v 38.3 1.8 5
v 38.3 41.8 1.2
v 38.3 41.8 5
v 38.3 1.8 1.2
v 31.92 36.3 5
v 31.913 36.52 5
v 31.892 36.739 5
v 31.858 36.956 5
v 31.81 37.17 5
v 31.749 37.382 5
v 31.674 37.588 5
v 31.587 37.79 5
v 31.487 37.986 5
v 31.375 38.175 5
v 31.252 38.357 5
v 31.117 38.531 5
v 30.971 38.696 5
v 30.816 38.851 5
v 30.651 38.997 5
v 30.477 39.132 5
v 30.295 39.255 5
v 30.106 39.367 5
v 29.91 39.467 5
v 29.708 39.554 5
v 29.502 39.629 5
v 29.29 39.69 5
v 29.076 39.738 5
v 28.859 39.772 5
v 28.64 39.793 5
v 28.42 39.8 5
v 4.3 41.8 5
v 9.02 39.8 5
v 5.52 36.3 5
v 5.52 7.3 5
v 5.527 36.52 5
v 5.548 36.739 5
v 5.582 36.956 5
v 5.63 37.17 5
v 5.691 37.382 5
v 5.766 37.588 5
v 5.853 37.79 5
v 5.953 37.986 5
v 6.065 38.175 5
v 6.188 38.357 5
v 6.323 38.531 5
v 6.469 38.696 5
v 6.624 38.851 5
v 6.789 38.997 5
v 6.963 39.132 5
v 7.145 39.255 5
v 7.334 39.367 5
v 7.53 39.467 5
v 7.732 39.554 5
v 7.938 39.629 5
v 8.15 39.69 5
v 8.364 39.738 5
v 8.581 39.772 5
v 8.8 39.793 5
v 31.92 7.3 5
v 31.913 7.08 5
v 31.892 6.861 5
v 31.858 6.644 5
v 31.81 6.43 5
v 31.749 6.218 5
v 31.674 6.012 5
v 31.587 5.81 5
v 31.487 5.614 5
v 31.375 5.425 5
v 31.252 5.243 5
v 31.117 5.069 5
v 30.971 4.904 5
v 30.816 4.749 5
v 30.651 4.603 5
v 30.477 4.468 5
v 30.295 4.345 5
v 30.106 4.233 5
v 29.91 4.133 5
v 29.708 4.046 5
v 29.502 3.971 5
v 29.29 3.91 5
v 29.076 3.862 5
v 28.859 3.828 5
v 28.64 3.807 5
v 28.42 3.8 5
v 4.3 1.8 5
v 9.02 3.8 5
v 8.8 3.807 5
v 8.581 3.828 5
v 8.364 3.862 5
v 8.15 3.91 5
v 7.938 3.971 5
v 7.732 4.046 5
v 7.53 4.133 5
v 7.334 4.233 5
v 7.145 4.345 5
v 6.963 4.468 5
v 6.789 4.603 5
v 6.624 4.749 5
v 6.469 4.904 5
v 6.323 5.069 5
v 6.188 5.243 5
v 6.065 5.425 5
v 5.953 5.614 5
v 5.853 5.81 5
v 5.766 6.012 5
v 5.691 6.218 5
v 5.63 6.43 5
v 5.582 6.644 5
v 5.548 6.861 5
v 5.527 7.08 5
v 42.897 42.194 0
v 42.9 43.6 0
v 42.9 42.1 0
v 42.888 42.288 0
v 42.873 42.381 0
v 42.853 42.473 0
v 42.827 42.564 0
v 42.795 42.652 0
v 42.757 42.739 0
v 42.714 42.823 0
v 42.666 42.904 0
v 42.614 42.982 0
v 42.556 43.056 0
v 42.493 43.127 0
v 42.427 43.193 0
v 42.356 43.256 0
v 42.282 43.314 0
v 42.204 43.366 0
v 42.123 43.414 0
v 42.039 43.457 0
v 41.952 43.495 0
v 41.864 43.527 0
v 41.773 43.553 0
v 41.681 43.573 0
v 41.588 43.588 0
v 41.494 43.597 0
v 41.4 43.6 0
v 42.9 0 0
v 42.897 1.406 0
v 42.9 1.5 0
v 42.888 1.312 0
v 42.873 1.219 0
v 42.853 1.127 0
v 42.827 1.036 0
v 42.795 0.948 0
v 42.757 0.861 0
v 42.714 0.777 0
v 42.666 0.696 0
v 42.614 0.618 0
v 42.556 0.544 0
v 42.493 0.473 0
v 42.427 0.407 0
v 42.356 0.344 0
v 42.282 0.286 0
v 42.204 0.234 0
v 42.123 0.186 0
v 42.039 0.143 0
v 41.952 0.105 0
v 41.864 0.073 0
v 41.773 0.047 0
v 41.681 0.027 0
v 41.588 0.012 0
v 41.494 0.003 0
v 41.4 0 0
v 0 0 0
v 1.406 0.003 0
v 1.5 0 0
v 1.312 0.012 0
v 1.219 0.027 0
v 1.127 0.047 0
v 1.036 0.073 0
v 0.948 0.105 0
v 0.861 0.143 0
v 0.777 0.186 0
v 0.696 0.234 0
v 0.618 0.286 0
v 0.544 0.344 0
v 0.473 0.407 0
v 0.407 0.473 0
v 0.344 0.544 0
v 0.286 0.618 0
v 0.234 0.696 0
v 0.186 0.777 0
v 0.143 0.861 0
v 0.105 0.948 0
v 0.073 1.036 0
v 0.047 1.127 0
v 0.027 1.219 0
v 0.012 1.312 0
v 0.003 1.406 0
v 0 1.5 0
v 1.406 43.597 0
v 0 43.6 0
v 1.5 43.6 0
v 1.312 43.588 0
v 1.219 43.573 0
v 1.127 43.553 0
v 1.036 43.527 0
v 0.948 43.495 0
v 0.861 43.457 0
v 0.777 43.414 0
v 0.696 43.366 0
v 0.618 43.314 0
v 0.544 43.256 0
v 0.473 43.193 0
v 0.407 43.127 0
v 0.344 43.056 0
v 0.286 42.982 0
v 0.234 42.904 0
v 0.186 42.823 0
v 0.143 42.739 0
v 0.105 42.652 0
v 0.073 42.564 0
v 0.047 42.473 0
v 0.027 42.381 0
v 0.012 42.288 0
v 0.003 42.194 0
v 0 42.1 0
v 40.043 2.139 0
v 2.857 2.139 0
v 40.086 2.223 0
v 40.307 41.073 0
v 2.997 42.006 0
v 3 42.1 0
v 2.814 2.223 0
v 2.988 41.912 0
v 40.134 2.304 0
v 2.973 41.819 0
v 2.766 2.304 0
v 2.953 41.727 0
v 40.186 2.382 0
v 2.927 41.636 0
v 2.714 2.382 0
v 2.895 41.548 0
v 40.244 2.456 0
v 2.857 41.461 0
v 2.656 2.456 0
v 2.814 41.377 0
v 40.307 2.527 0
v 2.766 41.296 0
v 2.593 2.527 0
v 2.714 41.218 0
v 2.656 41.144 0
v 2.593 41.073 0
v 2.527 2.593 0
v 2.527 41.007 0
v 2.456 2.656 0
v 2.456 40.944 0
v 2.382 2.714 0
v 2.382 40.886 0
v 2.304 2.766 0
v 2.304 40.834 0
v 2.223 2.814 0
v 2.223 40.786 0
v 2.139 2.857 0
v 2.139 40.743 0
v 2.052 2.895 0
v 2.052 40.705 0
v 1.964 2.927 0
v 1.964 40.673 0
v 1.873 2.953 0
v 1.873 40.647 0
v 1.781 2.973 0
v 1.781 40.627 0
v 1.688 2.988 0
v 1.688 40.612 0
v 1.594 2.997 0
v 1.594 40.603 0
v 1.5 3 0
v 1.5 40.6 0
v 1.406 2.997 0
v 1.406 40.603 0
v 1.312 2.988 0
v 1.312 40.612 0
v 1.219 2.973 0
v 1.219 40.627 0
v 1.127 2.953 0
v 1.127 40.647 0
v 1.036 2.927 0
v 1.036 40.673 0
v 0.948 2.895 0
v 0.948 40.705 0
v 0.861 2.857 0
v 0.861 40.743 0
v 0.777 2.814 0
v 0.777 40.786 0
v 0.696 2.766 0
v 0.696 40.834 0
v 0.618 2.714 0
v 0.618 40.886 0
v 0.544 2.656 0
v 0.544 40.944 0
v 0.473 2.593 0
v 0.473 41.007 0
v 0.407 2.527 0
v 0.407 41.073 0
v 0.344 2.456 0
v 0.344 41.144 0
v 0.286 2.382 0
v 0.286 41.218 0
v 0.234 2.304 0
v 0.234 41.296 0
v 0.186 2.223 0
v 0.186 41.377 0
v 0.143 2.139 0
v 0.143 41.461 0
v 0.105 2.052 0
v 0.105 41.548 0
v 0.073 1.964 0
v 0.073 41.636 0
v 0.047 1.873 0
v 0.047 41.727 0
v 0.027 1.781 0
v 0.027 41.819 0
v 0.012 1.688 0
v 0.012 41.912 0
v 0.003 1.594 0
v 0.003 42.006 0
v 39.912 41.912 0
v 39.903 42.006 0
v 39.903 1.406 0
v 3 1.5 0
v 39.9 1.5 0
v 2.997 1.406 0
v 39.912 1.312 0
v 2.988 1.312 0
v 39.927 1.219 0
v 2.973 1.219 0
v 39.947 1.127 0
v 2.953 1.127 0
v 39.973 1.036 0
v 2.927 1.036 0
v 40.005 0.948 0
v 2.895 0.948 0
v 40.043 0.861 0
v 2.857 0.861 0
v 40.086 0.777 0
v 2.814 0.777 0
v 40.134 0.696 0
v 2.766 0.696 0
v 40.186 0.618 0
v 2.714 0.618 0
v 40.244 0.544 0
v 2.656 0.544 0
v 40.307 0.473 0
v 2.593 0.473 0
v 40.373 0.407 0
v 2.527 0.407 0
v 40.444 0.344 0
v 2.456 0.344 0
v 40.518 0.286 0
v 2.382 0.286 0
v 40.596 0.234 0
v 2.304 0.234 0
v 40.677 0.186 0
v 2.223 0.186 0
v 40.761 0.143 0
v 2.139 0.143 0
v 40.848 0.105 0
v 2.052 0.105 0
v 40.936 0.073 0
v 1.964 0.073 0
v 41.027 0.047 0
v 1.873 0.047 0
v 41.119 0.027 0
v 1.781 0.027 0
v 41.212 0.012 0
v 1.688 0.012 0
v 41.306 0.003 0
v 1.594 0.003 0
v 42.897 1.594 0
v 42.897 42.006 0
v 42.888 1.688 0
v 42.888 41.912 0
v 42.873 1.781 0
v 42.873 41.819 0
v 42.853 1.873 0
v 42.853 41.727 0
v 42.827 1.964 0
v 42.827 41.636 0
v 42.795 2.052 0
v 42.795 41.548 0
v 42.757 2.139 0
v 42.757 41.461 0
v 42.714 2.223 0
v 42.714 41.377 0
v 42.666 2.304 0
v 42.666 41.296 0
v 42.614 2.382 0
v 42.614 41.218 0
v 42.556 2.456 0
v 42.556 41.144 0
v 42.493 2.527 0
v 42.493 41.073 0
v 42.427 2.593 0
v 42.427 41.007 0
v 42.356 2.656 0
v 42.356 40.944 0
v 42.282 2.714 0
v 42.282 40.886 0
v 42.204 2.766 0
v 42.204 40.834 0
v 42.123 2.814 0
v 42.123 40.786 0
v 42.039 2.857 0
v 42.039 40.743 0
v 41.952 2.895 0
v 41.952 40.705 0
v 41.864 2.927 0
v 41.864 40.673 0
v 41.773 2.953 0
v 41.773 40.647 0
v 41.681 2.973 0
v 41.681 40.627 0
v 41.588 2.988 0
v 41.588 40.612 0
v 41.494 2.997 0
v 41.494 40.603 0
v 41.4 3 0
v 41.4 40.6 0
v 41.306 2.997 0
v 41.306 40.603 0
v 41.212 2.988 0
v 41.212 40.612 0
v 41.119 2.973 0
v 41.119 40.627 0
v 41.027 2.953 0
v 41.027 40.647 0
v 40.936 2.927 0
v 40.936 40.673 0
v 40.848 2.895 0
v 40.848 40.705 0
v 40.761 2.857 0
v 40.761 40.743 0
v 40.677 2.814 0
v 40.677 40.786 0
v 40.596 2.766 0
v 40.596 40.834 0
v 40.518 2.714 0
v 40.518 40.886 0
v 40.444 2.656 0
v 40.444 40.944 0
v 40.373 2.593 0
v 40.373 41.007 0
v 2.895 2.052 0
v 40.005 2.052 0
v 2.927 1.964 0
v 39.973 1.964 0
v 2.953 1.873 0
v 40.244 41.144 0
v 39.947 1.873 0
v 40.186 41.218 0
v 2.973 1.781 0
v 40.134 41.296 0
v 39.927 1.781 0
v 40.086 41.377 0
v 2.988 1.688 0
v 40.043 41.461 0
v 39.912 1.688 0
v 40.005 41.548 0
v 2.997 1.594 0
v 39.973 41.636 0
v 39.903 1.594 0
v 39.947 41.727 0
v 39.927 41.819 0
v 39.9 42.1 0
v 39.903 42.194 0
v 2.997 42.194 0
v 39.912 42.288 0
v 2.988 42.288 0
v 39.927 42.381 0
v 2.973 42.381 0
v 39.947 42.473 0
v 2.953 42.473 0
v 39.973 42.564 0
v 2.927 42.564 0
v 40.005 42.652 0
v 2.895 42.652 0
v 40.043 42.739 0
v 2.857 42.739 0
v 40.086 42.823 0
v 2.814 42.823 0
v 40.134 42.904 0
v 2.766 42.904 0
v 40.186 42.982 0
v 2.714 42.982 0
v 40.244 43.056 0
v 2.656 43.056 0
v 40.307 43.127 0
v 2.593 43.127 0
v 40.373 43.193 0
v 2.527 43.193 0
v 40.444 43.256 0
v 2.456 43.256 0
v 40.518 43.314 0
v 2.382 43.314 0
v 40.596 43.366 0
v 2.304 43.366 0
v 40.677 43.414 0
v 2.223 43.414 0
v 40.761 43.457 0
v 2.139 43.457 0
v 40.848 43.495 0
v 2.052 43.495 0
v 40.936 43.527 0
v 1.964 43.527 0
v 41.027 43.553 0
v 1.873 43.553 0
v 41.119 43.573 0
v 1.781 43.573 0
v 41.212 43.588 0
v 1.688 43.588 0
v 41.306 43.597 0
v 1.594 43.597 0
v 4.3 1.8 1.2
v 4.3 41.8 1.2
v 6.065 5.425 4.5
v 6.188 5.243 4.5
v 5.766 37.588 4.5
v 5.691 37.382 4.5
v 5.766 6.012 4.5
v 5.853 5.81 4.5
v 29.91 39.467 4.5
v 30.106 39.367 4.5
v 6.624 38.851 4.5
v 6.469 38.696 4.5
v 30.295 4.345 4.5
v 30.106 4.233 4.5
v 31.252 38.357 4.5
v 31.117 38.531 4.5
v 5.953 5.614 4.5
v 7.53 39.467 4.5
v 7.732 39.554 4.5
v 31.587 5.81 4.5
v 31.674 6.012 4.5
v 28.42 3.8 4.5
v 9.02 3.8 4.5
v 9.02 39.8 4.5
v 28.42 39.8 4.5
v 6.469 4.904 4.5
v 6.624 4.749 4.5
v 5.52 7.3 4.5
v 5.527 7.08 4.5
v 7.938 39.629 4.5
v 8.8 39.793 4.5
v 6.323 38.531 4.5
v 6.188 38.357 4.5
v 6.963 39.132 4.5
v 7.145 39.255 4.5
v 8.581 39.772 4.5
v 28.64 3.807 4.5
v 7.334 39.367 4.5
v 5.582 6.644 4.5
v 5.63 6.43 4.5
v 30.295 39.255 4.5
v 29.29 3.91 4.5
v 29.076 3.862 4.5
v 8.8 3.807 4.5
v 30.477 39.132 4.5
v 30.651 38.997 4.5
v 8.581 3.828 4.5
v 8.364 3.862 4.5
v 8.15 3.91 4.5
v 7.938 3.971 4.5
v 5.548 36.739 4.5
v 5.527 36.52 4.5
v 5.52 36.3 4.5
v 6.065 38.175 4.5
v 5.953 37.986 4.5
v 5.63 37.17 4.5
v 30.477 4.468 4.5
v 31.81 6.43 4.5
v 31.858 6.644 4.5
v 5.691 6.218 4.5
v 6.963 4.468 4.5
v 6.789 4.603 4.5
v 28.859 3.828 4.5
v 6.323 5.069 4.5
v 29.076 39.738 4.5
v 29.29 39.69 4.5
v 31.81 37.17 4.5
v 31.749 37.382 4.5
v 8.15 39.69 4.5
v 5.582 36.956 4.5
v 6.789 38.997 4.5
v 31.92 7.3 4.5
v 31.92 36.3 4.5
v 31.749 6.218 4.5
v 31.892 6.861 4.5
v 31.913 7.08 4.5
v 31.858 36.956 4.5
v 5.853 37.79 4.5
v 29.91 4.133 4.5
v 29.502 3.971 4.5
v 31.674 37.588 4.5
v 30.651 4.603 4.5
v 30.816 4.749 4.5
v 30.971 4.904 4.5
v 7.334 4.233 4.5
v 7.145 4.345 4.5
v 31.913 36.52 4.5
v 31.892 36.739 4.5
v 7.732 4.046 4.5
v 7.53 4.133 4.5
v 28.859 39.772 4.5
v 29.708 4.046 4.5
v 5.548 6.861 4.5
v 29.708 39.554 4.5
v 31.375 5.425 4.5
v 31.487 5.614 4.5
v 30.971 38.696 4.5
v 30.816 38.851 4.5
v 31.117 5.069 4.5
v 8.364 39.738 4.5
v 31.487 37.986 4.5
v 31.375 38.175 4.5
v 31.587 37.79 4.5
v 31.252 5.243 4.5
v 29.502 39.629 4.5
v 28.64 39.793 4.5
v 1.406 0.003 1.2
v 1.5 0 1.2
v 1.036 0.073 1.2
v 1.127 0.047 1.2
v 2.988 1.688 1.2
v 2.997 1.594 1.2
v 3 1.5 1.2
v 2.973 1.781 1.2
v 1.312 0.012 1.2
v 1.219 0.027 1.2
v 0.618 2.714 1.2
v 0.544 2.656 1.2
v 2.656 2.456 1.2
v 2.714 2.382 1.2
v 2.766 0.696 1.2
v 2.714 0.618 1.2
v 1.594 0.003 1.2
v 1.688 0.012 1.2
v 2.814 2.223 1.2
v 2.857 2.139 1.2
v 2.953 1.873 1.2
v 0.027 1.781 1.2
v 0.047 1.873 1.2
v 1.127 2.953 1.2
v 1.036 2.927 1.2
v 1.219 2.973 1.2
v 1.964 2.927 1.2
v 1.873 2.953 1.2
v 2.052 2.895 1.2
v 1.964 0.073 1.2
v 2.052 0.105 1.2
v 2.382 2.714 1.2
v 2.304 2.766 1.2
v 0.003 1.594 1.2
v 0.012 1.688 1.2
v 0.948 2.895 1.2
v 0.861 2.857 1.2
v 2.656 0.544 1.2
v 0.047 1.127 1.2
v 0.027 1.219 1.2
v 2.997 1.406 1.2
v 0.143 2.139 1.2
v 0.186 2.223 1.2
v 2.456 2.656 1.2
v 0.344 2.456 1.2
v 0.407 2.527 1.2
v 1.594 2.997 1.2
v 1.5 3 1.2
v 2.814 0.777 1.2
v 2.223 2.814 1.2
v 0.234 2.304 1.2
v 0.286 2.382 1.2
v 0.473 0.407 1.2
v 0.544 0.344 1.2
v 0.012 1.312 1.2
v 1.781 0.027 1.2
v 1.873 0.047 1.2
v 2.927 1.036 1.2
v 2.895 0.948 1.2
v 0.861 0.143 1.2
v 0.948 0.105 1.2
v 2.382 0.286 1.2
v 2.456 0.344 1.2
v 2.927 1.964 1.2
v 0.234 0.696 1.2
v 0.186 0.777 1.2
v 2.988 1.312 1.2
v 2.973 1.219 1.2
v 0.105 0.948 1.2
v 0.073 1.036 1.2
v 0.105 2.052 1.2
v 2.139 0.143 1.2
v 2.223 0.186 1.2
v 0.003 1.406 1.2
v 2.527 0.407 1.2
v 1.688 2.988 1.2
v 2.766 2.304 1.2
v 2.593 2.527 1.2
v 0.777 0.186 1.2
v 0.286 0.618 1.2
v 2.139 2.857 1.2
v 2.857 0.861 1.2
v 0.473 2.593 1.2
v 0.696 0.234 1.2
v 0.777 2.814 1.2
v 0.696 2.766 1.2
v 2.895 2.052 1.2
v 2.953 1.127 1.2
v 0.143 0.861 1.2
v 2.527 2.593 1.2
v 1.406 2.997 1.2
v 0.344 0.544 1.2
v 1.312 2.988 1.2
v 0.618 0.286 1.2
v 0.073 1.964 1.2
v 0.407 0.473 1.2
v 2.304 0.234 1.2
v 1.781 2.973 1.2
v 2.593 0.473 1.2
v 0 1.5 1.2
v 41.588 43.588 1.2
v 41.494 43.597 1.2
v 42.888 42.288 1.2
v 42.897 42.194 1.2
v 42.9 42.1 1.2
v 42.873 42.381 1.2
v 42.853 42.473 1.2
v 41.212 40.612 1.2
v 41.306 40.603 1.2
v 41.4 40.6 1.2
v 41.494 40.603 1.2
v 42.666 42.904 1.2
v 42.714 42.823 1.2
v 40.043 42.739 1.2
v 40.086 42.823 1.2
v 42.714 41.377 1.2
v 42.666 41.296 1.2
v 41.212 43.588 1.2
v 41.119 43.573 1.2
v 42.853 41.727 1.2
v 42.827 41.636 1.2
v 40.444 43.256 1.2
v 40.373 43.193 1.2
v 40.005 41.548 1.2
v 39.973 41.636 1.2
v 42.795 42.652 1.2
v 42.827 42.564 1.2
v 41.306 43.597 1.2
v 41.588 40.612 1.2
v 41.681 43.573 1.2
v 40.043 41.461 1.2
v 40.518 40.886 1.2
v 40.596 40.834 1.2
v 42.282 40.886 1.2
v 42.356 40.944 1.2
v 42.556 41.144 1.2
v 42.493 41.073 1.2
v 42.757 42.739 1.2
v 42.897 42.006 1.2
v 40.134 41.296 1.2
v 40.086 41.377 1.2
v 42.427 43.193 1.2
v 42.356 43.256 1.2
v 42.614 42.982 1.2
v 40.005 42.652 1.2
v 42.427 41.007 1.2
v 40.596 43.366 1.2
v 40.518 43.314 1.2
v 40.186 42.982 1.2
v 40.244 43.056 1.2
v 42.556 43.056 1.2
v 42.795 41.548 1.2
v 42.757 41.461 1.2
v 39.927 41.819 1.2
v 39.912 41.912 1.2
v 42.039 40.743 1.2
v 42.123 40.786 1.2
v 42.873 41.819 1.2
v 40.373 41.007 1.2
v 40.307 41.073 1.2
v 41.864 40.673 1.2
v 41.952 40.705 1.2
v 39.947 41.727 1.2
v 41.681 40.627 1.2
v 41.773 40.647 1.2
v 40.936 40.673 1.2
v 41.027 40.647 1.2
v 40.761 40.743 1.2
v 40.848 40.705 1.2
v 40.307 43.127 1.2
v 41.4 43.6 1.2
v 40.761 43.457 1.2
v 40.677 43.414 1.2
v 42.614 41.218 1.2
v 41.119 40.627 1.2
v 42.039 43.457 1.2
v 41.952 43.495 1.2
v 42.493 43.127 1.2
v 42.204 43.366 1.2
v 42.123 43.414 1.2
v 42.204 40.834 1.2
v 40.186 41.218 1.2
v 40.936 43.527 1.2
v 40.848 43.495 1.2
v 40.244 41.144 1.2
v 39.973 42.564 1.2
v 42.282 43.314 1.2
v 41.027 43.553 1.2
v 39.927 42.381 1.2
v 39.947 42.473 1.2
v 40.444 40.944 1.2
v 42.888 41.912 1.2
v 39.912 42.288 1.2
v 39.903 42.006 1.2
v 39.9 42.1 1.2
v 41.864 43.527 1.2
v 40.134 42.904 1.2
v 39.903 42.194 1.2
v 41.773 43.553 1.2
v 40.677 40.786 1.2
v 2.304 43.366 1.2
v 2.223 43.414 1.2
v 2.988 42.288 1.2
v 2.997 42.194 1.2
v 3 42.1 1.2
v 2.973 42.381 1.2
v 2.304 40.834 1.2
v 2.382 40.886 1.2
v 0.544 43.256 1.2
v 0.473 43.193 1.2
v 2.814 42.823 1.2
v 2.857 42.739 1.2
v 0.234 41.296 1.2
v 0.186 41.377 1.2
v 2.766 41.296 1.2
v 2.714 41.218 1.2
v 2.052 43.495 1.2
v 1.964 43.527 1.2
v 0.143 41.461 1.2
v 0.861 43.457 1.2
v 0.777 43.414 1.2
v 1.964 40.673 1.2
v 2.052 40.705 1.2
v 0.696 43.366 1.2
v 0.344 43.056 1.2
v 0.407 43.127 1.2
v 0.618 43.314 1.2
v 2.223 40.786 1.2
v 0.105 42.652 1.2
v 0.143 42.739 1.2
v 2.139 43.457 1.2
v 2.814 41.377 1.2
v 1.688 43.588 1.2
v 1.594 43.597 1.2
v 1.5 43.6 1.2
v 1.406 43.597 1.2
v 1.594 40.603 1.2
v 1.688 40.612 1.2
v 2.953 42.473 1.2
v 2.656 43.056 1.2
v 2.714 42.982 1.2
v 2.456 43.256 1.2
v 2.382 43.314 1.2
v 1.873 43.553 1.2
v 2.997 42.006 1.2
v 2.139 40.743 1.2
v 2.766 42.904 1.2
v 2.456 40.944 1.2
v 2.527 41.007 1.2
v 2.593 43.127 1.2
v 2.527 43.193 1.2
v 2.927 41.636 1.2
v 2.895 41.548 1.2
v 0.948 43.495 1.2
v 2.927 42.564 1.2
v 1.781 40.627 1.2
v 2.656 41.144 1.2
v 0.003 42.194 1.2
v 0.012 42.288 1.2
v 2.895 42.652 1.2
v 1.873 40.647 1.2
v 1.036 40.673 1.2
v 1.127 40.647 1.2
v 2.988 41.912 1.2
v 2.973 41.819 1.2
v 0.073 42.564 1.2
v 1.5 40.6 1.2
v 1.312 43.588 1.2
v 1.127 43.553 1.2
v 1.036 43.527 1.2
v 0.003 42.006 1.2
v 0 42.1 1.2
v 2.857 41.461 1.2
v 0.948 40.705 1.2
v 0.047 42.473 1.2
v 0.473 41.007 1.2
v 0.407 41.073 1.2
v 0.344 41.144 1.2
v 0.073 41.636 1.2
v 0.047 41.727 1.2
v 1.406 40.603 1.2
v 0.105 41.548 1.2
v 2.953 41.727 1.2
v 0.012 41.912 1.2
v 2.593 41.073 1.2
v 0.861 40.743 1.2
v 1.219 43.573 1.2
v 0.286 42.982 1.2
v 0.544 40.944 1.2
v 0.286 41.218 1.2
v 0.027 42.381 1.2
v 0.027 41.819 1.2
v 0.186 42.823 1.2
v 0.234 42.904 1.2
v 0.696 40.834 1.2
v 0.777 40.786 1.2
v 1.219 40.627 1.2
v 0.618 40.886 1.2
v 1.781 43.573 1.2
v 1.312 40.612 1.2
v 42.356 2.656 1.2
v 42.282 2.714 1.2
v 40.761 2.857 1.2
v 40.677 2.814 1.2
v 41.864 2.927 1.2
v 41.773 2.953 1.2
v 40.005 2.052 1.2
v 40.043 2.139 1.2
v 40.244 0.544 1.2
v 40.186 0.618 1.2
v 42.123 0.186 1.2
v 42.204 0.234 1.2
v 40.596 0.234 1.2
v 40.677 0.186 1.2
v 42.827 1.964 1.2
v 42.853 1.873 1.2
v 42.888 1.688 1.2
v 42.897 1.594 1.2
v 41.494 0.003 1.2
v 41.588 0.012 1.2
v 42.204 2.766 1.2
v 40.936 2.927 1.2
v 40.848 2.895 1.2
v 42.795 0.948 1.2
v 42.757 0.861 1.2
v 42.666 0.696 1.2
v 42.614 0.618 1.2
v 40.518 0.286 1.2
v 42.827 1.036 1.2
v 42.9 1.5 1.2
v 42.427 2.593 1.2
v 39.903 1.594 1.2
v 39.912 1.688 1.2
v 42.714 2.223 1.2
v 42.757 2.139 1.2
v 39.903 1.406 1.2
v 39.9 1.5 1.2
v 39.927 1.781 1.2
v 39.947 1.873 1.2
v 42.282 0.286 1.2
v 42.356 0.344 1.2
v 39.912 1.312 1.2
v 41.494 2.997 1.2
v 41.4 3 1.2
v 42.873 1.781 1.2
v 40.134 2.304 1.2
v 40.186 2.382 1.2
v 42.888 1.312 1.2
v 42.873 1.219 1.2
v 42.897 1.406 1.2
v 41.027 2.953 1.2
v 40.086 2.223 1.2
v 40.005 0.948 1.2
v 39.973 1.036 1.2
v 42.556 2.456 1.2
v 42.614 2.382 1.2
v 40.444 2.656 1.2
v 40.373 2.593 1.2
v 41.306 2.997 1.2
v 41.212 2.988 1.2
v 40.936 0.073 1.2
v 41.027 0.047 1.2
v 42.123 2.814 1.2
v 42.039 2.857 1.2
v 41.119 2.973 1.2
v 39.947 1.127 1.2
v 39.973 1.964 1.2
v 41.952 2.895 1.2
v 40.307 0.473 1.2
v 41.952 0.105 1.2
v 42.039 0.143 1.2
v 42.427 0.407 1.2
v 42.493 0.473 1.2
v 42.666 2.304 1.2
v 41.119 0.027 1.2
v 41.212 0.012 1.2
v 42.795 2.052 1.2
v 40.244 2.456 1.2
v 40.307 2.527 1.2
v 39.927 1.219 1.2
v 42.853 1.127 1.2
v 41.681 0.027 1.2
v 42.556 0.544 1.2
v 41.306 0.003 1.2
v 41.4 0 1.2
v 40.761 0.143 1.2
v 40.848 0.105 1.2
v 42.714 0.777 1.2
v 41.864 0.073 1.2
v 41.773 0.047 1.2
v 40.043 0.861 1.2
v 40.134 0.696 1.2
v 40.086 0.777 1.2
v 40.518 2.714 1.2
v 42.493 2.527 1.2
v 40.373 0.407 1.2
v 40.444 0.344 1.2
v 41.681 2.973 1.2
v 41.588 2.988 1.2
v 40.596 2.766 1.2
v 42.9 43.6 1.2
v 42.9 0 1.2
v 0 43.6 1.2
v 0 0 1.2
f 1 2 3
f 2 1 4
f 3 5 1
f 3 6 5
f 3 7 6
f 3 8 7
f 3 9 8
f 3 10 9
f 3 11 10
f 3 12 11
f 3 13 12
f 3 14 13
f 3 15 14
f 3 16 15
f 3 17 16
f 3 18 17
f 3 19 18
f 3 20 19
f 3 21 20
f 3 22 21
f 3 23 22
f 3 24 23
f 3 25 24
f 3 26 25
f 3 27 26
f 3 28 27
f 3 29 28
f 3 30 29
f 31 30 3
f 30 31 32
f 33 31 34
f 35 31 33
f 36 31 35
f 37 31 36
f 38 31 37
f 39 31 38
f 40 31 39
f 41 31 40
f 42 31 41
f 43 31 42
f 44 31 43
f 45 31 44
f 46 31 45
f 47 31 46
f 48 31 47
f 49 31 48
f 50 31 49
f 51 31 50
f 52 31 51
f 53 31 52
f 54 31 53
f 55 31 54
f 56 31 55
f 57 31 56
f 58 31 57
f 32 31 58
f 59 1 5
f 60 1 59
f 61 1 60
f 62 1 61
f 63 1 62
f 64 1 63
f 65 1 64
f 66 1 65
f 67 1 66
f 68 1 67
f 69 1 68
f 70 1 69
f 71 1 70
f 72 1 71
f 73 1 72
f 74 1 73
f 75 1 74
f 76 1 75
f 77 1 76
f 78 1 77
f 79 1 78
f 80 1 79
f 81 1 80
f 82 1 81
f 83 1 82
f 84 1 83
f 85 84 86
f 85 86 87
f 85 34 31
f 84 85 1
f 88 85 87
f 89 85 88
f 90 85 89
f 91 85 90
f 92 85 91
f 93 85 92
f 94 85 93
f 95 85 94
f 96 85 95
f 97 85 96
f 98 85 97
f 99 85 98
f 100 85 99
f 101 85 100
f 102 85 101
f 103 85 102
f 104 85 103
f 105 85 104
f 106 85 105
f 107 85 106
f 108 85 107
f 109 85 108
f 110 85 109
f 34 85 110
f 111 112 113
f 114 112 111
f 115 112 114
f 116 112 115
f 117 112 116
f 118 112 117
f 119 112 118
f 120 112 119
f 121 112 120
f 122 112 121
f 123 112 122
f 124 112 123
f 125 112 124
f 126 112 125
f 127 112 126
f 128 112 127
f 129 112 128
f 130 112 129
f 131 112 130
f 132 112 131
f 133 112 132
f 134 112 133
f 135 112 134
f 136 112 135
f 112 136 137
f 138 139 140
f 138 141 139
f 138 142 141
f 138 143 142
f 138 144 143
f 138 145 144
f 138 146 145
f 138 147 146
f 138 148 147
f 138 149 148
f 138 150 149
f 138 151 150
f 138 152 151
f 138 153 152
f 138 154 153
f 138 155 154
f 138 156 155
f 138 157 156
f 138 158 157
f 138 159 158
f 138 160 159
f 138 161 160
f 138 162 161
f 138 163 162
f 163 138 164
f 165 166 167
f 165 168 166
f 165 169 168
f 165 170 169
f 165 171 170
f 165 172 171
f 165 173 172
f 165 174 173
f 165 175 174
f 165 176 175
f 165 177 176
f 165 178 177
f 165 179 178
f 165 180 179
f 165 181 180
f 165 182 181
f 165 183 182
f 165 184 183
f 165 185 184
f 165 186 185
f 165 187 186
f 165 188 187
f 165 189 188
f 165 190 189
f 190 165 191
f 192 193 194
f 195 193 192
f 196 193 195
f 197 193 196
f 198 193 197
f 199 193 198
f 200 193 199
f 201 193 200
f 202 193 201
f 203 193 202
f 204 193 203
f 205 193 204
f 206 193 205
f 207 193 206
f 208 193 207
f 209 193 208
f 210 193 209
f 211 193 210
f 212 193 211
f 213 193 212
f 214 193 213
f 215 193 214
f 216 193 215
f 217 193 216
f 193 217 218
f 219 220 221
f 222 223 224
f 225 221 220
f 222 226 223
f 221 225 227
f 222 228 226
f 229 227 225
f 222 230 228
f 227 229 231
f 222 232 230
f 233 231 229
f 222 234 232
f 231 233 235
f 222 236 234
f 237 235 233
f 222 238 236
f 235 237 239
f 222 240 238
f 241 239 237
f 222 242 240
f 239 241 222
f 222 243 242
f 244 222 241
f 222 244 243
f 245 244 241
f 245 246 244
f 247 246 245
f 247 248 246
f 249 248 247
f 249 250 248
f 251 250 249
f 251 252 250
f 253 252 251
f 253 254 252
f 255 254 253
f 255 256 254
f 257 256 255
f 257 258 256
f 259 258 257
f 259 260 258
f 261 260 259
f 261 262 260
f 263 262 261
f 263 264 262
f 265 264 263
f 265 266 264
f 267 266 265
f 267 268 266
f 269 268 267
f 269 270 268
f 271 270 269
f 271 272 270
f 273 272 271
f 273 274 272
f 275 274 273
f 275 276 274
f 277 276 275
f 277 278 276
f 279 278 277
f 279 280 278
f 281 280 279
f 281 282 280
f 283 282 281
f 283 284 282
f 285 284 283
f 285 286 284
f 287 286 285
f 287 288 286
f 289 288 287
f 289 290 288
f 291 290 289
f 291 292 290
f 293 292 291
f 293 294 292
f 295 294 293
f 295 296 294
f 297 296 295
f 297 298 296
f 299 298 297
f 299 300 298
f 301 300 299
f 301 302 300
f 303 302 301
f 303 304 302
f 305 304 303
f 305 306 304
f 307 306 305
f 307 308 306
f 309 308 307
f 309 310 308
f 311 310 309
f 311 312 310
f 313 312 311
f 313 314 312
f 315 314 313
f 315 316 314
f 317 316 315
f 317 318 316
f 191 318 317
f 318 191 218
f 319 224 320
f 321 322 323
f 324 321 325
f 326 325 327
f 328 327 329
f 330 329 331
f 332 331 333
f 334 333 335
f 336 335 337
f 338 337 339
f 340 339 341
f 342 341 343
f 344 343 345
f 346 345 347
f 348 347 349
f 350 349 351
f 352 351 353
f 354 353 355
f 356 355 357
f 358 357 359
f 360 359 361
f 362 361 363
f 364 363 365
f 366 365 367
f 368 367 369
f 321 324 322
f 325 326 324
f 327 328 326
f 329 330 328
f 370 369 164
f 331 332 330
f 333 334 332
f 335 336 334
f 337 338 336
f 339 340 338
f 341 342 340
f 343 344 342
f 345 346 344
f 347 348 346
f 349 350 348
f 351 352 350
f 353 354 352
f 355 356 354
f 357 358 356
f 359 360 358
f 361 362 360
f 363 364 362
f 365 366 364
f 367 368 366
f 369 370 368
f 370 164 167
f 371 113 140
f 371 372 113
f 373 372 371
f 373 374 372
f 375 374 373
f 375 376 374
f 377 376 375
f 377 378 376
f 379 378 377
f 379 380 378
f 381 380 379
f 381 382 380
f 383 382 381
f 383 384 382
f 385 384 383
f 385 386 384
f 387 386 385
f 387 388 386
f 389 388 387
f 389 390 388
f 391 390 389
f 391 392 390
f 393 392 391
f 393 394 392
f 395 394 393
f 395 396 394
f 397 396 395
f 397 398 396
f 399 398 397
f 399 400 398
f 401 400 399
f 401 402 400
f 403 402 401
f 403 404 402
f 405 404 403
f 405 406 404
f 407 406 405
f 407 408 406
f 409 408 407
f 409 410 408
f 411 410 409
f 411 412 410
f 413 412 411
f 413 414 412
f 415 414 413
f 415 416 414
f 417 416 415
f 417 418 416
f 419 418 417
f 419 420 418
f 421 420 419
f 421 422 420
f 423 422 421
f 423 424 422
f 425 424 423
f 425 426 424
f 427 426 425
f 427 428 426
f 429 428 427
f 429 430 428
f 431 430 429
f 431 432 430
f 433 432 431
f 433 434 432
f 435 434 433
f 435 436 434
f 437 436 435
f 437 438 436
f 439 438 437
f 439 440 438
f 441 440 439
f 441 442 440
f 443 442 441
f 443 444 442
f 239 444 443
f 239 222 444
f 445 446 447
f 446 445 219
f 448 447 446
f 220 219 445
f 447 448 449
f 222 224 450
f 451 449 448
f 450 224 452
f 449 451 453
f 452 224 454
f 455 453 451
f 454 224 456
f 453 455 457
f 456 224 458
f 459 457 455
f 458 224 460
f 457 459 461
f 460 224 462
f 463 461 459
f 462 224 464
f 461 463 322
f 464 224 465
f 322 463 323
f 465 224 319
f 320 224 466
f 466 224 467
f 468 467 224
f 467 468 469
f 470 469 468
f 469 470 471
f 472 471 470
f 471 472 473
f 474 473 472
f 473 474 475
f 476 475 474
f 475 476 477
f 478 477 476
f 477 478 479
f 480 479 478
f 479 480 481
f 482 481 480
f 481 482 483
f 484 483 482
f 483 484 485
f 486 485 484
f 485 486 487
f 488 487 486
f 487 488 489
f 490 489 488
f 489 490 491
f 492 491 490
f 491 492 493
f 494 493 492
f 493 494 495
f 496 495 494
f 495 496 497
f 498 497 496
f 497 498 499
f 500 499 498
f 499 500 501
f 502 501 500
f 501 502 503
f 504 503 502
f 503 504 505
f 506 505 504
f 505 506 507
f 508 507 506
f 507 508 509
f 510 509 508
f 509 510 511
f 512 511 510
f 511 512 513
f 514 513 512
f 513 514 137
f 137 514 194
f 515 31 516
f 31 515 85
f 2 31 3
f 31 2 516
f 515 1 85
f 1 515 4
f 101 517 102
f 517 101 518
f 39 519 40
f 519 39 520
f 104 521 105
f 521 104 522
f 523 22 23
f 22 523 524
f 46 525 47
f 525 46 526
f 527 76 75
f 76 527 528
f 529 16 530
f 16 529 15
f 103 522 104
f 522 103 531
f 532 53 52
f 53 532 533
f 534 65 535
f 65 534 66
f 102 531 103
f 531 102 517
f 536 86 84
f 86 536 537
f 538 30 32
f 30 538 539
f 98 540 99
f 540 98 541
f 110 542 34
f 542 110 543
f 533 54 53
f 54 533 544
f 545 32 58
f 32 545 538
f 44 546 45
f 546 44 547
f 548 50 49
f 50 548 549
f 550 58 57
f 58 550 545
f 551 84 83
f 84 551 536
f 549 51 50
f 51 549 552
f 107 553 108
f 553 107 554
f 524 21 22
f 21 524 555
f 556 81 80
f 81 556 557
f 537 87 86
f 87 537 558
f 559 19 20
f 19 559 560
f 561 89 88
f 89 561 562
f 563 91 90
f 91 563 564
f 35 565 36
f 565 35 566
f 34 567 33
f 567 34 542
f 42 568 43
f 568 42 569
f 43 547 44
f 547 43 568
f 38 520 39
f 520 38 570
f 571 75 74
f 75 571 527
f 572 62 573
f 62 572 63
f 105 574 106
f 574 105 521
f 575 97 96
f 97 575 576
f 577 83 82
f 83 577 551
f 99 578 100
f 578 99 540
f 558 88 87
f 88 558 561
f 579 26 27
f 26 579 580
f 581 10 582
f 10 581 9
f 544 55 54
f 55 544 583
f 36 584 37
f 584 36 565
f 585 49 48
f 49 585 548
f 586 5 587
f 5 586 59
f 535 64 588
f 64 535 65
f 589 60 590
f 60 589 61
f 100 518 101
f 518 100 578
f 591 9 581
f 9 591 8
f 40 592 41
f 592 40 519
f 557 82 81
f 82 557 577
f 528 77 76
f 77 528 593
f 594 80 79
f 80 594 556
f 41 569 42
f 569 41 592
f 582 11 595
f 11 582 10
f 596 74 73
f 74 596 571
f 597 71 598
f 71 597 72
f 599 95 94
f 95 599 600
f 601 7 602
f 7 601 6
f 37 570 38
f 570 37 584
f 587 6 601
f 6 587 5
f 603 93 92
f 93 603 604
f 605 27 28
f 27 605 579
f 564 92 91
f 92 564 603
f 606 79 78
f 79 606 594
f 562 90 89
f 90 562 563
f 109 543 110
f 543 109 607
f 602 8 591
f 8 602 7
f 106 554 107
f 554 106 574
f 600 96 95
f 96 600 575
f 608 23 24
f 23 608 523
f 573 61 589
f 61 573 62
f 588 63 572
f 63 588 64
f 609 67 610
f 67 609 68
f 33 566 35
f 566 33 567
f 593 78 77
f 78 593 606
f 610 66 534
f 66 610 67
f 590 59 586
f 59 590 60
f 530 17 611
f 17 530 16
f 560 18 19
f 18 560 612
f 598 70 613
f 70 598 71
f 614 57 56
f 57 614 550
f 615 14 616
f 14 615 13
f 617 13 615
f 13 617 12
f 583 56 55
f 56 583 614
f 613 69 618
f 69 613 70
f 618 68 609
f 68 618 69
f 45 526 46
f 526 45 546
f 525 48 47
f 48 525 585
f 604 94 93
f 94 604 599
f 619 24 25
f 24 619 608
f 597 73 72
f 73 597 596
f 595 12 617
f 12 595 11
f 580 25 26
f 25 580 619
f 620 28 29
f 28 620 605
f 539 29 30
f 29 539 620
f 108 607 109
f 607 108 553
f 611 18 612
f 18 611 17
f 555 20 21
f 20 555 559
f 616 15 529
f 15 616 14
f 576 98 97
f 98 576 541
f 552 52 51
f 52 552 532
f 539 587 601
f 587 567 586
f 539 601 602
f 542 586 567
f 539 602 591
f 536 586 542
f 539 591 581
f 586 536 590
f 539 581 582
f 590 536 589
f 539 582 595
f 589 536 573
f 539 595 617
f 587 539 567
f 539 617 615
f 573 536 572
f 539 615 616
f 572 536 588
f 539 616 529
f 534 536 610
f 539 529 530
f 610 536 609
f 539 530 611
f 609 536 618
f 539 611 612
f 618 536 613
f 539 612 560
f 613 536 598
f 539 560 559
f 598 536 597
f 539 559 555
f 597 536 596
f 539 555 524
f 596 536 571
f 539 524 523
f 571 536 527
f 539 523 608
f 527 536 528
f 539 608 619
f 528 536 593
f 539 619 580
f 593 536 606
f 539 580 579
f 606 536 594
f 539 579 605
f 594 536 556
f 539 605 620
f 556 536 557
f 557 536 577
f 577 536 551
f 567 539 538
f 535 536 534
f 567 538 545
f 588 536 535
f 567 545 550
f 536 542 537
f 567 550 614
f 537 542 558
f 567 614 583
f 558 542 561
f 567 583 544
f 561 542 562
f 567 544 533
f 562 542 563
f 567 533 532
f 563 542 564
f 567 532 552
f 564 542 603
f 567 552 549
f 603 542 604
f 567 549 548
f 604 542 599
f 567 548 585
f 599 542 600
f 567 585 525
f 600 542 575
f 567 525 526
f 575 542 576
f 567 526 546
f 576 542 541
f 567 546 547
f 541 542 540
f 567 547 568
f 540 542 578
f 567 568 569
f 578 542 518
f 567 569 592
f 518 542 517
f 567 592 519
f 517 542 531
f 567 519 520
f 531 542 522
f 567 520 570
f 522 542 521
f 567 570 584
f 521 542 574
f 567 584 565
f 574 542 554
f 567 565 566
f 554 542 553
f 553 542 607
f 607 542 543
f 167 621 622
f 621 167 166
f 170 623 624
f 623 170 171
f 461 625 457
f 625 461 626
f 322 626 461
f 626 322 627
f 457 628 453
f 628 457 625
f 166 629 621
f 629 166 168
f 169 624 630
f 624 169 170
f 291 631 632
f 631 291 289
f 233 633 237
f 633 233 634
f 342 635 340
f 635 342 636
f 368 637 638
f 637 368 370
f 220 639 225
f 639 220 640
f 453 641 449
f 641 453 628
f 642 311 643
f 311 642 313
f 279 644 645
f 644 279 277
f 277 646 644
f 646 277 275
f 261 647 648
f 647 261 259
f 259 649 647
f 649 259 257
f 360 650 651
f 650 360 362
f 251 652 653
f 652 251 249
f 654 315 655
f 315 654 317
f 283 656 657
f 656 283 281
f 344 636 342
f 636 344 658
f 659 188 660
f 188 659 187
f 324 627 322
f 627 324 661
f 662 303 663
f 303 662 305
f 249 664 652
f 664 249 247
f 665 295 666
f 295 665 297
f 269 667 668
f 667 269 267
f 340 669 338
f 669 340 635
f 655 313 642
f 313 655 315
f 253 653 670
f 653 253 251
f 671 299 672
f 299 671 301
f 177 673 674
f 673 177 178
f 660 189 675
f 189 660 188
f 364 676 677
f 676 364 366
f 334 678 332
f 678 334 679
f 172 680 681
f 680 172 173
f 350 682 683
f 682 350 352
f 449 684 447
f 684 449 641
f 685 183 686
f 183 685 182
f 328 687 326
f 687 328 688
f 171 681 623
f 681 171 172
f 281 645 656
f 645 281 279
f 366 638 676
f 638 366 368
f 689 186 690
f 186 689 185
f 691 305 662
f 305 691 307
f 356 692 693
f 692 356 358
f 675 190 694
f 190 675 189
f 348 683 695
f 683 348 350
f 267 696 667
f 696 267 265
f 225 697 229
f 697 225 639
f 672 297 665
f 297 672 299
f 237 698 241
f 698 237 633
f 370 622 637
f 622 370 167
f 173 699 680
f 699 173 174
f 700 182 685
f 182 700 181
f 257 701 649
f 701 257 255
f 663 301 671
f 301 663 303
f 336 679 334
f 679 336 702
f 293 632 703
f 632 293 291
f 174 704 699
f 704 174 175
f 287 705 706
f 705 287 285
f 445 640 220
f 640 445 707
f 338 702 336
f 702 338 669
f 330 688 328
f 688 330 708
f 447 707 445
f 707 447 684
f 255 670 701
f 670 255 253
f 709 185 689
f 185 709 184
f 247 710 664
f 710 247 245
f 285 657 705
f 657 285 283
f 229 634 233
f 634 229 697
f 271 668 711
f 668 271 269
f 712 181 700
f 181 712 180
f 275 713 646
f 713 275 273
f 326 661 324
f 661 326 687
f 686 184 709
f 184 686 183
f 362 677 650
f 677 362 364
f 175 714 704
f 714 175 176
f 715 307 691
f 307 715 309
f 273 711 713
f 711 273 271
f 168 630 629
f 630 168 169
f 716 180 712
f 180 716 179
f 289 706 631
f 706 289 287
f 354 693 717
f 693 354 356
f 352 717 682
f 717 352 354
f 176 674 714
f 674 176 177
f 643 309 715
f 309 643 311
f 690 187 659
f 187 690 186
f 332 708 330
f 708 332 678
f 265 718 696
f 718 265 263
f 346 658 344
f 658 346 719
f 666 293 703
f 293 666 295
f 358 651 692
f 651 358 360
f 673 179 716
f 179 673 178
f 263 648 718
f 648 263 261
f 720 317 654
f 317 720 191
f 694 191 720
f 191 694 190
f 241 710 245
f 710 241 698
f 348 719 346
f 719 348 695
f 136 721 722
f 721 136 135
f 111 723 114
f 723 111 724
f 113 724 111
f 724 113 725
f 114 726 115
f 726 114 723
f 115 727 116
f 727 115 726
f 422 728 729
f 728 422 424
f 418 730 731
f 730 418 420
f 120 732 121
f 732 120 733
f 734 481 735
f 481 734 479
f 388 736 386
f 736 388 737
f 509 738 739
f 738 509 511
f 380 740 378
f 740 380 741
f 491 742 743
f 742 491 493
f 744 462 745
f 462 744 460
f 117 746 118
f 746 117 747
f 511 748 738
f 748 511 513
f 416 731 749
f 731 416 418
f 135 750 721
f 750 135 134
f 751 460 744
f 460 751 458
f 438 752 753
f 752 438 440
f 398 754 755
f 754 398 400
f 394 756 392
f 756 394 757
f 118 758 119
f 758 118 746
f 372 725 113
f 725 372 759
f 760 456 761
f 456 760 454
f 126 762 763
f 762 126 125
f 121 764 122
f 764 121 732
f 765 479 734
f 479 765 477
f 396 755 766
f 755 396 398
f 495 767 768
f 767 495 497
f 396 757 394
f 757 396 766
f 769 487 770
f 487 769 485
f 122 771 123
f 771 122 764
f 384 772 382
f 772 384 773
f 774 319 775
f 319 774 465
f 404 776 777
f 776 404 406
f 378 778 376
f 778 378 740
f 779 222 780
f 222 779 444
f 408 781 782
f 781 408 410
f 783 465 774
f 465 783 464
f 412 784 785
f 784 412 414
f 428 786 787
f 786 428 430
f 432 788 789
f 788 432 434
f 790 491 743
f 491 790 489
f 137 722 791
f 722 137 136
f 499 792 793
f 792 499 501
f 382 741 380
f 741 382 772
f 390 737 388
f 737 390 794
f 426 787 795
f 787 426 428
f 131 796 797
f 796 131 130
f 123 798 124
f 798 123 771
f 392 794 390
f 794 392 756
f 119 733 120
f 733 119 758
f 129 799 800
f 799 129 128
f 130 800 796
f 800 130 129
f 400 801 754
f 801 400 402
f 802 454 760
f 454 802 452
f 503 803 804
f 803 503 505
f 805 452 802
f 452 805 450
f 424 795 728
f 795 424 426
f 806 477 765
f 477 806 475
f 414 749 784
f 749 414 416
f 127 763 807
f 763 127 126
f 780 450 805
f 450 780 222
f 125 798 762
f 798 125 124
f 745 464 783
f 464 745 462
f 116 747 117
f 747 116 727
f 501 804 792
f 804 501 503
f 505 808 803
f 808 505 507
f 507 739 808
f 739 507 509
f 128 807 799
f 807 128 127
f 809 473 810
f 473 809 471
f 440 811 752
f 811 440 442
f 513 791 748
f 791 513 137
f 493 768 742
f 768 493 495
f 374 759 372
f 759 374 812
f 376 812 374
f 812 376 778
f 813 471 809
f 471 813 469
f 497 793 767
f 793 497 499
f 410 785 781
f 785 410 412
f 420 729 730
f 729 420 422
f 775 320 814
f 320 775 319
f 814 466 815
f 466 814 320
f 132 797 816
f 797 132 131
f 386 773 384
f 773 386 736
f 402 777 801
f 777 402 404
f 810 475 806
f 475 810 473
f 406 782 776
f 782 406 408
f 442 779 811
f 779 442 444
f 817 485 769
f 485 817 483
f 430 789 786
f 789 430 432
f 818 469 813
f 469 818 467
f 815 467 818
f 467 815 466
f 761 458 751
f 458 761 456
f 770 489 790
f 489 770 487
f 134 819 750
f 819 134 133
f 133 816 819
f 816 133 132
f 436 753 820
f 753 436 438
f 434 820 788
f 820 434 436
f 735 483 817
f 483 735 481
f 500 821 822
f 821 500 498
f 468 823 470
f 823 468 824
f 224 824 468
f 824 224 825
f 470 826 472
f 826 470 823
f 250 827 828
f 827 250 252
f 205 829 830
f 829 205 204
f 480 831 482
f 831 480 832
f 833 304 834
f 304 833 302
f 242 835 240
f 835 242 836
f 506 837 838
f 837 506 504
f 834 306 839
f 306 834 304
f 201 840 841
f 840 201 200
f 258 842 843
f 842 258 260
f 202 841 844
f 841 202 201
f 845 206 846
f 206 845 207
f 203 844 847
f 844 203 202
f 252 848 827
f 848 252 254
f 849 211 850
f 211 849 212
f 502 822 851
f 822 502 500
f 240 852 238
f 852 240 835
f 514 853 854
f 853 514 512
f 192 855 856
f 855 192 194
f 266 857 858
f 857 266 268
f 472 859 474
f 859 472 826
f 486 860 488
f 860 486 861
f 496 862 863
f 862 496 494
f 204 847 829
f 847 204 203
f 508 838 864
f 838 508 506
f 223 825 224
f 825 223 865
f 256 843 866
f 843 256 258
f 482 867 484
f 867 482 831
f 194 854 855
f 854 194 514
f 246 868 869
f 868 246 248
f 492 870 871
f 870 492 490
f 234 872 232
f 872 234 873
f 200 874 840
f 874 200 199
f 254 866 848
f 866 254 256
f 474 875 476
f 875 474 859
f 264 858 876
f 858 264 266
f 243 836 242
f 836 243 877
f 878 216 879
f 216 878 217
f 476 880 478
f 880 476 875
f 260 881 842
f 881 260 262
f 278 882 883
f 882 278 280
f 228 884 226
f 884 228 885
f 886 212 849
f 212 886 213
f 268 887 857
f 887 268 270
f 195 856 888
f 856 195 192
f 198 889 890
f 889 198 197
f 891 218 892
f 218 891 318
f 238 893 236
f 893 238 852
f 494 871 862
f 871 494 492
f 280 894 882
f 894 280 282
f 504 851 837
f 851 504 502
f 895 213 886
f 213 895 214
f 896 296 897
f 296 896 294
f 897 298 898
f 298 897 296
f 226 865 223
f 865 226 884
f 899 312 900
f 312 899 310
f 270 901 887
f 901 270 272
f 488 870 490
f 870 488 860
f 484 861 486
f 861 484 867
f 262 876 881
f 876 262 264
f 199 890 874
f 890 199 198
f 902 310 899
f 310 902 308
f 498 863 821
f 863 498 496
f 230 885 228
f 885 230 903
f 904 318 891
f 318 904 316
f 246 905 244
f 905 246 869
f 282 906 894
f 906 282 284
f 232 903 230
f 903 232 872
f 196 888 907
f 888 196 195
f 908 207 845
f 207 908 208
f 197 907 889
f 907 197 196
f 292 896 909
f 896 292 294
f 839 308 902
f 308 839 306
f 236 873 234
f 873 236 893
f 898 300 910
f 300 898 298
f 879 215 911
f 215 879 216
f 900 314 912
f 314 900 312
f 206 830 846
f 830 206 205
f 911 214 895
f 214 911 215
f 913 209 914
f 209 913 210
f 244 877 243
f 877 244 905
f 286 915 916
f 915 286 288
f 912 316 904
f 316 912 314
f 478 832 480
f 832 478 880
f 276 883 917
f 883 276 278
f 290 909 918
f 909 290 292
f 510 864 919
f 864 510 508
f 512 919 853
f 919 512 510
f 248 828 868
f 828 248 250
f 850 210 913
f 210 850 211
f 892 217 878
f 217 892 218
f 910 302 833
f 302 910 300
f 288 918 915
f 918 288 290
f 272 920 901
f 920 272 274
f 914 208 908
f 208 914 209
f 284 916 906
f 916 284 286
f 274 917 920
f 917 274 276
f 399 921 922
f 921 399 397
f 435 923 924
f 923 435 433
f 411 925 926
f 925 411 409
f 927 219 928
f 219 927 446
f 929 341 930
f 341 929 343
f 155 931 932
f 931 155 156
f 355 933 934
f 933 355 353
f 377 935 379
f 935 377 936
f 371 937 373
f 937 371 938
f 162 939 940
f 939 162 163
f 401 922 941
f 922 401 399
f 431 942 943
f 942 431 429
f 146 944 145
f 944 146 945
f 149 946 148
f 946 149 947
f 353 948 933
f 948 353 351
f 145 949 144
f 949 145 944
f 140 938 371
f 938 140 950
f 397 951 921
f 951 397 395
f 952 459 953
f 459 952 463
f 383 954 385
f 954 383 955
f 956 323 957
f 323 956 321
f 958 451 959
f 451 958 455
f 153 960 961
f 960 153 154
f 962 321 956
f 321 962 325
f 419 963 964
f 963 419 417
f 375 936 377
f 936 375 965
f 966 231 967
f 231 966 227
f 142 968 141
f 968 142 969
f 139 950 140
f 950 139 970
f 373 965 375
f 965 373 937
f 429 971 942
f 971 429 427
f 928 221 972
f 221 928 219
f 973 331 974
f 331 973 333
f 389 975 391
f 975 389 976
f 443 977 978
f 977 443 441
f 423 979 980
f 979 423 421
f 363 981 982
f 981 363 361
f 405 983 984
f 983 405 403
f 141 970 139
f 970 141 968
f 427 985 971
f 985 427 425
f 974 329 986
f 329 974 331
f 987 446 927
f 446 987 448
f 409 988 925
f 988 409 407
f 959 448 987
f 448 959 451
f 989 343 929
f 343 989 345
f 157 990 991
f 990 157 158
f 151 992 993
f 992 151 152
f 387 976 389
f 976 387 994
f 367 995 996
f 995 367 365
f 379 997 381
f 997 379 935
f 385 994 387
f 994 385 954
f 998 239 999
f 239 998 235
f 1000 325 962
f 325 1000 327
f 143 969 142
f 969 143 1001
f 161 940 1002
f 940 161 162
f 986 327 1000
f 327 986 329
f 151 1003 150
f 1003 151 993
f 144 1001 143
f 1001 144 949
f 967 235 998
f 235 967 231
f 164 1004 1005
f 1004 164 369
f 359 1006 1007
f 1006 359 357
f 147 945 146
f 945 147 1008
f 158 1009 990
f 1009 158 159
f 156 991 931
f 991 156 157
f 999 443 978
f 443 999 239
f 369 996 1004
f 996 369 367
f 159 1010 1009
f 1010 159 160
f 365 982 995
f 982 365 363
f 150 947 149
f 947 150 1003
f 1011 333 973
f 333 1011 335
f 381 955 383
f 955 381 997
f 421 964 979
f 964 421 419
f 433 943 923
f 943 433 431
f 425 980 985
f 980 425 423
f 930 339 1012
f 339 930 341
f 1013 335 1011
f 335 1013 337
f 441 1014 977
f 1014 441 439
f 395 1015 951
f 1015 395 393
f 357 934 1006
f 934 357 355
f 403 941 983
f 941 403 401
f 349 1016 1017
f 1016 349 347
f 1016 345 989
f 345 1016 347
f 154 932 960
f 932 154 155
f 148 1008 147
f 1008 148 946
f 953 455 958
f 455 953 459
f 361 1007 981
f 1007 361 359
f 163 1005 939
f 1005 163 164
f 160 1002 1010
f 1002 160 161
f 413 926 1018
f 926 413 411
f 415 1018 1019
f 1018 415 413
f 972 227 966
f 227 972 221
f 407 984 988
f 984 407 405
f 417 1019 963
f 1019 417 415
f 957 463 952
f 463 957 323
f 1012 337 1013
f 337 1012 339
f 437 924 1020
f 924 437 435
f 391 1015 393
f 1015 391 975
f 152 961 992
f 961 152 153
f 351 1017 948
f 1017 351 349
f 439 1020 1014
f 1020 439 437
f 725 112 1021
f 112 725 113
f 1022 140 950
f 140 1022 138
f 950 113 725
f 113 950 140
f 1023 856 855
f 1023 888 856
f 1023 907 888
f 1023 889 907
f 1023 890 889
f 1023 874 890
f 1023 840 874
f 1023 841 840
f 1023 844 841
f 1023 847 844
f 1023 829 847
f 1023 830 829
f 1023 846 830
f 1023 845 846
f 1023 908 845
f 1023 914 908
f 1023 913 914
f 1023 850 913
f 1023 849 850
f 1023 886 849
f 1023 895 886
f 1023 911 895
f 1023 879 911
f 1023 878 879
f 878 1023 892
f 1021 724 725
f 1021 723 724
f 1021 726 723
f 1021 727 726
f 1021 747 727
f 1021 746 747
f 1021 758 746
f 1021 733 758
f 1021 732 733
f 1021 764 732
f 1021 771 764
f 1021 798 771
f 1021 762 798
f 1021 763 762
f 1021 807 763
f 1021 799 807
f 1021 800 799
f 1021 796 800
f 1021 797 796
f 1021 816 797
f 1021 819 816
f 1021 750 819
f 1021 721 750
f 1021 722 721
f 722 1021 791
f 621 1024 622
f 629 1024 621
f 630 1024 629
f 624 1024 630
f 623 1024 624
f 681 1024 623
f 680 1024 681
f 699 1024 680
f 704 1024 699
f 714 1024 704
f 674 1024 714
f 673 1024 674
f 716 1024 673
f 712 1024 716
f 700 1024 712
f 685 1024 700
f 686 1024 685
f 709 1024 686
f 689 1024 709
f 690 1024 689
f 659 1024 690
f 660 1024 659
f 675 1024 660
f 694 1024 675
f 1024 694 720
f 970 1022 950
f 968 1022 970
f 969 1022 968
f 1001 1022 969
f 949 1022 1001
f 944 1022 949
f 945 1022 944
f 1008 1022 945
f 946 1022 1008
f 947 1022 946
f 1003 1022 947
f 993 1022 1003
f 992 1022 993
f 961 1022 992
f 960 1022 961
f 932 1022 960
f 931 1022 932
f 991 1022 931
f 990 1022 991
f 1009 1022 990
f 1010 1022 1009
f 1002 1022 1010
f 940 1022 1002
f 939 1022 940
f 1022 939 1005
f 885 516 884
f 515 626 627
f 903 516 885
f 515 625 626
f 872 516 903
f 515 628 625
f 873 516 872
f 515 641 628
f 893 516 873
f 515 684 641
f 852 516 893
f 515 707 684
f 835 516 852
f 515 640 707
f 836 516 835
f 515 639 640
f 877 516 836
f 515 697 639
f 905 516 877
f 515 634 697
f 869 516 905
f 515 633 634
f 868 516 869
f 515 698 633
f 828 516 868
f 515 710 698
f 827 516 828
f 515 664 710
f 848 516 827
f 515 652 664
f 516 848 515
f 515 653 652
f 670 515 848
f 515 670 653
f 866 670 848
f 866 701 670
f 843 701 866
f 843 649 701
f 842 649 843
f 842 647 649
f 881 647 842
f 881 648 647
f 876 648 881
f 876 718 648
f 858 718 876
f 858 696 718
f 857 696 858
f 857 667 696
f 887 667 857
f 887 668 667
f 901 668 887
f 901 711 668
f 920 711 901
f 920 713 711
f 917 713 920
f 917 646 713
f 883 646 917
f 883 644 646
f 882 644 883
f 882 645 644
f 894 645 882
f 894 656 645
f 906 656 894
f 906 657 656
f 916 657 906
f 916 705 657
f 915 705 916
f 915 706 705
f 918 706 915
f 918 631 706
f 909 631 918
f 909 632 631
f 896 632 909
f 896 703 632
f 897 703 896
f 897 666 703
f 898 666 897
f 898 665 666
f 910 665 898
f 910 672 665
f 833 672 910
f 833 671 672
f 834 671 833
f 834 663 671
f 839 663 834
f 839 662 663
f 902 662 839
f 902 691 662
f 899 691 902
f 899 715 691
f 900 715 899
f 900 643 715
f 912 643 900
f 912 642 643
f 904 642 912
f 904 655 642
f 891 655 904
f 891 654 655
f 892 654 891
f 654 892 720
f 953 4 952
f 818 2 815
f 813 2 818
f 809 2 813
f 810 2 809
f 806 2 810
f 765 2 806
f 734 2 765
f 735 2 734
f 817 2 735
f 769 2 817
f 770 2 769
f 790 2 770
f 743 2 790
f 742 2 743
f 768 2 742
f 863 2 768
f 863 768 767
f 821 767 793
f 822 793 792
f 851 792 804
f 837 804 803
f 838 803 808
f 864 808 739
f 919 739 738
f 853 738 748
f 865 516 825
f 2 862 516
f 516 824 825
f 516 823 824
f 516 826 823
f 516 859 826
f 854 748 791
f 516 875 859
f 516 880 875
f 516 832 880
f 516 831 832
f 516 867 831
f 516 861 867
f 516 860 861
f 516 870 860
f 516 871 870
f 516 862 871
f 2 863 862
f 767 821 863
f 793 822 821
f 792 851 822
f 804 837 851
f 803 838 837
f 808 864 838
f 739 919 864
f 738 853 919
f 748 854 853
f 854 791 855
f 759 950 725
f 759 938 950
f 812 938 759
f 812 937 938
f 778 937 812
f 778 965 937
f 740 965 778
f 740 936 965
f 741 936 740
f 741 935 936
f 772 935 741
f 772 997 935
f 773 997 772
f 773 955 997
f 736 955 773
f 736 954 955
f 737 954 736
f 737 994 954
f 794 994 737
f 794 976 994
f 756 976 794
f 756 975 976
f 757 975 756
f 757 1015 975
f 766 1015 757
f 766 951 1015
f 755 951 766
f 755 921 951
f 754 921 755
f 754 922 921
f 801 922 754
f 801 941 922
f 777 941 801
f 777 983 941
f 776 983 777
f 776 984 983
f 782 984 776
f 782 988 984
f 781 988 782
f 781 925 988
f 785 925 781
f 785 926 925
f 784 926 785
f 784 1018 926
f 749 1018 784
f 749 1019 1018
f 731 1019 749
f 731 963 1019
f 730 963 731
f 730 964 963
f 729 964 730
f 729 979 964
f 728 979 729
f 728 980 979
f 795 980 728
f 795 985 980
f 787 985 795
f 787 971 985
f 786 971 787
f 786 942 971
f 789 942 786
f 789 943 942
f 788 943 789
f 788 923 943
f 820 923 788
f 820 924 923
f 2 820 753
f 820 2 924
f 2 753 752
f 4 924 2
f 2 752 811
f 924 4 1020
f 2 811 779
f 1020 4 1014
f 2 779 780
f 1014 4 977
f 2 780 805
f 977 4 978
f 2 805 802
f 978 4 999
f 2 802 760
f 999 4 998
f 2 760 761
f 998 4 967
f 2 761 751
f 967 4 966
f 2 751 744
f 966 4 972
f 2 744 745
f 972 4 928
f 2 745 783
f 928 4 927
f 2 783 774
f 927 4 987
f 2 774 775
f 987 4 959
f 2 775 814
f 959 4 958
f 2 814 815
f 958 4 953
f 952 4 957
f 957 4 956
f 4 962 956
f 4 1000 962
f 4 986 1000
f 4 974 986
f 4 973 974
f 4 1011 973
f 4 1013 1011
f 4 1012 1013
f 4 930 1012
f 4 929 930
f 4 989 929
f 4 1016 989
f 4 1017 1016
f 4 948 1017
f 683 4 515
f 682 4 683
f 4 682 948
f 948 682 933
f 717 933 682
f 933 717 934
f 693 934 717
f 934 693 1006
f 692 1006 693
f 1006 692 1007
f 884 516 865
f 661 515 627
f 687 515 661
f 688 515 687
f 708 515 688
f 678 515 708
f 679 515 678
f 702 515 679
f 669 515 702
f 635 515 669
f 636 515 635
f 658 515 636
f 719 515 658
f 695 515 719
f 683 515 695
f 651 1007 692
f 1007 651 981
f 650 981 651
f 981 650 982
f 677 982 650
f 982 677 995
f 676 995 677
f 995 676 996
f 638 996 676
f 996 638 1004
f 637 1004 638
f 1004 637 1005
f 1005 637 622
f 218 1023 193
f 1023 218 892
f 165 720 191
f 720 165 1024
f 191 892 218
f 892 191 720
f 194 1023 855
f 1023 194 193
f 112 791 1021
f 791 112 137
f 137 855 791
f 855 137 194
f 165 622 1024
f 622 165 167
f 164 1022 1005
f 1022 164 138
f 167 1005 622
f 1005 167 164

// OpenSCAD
$fn = 100;

module seethru_bit(h) {
    width = 36;
    height = 26.4;
    radius = 3.5;

    hull() {
        translate([radius, radius, 0])
            cylinder(r=radius, h=h);
        translate([height-radius, width-radius, 0])
            cylinder(r=radius, h=h);    
        translate([radius, width-radius, 0])
            cylinder(r=radius, h=h);       
        translate([height-radius, radius, 0])
            cylinder(r=radius, h=h);     
    }   
}

module corner_mounted(height, width, h, radius) {
    difference() {
        cube([height, width, h]);
        
        translate([0, 0, -0.1]) {
            translate([radius, radius, 0])
                cylinder(r=radius, h=h+0.2);
            translate([height-radius, width-radius, 0])
                cylinder(r=radius, h=h+0.2);    
            translate([radius, width-radius, 0])
                cylinder(r=radius, h=h+0.2);       
            translate([height-radius, radius, 0])
                cylinder(r=radius, h=h+0.2);
        }
    }   
}


translate([4.3, 1.8, 0])
difference() {
    cube([34, 40, 5]);

    translate([1.22, 2, 4.5])
        seethru_bit(10);
}


corner_mounted(42.9, 43.6, 1.2, 1.5);
